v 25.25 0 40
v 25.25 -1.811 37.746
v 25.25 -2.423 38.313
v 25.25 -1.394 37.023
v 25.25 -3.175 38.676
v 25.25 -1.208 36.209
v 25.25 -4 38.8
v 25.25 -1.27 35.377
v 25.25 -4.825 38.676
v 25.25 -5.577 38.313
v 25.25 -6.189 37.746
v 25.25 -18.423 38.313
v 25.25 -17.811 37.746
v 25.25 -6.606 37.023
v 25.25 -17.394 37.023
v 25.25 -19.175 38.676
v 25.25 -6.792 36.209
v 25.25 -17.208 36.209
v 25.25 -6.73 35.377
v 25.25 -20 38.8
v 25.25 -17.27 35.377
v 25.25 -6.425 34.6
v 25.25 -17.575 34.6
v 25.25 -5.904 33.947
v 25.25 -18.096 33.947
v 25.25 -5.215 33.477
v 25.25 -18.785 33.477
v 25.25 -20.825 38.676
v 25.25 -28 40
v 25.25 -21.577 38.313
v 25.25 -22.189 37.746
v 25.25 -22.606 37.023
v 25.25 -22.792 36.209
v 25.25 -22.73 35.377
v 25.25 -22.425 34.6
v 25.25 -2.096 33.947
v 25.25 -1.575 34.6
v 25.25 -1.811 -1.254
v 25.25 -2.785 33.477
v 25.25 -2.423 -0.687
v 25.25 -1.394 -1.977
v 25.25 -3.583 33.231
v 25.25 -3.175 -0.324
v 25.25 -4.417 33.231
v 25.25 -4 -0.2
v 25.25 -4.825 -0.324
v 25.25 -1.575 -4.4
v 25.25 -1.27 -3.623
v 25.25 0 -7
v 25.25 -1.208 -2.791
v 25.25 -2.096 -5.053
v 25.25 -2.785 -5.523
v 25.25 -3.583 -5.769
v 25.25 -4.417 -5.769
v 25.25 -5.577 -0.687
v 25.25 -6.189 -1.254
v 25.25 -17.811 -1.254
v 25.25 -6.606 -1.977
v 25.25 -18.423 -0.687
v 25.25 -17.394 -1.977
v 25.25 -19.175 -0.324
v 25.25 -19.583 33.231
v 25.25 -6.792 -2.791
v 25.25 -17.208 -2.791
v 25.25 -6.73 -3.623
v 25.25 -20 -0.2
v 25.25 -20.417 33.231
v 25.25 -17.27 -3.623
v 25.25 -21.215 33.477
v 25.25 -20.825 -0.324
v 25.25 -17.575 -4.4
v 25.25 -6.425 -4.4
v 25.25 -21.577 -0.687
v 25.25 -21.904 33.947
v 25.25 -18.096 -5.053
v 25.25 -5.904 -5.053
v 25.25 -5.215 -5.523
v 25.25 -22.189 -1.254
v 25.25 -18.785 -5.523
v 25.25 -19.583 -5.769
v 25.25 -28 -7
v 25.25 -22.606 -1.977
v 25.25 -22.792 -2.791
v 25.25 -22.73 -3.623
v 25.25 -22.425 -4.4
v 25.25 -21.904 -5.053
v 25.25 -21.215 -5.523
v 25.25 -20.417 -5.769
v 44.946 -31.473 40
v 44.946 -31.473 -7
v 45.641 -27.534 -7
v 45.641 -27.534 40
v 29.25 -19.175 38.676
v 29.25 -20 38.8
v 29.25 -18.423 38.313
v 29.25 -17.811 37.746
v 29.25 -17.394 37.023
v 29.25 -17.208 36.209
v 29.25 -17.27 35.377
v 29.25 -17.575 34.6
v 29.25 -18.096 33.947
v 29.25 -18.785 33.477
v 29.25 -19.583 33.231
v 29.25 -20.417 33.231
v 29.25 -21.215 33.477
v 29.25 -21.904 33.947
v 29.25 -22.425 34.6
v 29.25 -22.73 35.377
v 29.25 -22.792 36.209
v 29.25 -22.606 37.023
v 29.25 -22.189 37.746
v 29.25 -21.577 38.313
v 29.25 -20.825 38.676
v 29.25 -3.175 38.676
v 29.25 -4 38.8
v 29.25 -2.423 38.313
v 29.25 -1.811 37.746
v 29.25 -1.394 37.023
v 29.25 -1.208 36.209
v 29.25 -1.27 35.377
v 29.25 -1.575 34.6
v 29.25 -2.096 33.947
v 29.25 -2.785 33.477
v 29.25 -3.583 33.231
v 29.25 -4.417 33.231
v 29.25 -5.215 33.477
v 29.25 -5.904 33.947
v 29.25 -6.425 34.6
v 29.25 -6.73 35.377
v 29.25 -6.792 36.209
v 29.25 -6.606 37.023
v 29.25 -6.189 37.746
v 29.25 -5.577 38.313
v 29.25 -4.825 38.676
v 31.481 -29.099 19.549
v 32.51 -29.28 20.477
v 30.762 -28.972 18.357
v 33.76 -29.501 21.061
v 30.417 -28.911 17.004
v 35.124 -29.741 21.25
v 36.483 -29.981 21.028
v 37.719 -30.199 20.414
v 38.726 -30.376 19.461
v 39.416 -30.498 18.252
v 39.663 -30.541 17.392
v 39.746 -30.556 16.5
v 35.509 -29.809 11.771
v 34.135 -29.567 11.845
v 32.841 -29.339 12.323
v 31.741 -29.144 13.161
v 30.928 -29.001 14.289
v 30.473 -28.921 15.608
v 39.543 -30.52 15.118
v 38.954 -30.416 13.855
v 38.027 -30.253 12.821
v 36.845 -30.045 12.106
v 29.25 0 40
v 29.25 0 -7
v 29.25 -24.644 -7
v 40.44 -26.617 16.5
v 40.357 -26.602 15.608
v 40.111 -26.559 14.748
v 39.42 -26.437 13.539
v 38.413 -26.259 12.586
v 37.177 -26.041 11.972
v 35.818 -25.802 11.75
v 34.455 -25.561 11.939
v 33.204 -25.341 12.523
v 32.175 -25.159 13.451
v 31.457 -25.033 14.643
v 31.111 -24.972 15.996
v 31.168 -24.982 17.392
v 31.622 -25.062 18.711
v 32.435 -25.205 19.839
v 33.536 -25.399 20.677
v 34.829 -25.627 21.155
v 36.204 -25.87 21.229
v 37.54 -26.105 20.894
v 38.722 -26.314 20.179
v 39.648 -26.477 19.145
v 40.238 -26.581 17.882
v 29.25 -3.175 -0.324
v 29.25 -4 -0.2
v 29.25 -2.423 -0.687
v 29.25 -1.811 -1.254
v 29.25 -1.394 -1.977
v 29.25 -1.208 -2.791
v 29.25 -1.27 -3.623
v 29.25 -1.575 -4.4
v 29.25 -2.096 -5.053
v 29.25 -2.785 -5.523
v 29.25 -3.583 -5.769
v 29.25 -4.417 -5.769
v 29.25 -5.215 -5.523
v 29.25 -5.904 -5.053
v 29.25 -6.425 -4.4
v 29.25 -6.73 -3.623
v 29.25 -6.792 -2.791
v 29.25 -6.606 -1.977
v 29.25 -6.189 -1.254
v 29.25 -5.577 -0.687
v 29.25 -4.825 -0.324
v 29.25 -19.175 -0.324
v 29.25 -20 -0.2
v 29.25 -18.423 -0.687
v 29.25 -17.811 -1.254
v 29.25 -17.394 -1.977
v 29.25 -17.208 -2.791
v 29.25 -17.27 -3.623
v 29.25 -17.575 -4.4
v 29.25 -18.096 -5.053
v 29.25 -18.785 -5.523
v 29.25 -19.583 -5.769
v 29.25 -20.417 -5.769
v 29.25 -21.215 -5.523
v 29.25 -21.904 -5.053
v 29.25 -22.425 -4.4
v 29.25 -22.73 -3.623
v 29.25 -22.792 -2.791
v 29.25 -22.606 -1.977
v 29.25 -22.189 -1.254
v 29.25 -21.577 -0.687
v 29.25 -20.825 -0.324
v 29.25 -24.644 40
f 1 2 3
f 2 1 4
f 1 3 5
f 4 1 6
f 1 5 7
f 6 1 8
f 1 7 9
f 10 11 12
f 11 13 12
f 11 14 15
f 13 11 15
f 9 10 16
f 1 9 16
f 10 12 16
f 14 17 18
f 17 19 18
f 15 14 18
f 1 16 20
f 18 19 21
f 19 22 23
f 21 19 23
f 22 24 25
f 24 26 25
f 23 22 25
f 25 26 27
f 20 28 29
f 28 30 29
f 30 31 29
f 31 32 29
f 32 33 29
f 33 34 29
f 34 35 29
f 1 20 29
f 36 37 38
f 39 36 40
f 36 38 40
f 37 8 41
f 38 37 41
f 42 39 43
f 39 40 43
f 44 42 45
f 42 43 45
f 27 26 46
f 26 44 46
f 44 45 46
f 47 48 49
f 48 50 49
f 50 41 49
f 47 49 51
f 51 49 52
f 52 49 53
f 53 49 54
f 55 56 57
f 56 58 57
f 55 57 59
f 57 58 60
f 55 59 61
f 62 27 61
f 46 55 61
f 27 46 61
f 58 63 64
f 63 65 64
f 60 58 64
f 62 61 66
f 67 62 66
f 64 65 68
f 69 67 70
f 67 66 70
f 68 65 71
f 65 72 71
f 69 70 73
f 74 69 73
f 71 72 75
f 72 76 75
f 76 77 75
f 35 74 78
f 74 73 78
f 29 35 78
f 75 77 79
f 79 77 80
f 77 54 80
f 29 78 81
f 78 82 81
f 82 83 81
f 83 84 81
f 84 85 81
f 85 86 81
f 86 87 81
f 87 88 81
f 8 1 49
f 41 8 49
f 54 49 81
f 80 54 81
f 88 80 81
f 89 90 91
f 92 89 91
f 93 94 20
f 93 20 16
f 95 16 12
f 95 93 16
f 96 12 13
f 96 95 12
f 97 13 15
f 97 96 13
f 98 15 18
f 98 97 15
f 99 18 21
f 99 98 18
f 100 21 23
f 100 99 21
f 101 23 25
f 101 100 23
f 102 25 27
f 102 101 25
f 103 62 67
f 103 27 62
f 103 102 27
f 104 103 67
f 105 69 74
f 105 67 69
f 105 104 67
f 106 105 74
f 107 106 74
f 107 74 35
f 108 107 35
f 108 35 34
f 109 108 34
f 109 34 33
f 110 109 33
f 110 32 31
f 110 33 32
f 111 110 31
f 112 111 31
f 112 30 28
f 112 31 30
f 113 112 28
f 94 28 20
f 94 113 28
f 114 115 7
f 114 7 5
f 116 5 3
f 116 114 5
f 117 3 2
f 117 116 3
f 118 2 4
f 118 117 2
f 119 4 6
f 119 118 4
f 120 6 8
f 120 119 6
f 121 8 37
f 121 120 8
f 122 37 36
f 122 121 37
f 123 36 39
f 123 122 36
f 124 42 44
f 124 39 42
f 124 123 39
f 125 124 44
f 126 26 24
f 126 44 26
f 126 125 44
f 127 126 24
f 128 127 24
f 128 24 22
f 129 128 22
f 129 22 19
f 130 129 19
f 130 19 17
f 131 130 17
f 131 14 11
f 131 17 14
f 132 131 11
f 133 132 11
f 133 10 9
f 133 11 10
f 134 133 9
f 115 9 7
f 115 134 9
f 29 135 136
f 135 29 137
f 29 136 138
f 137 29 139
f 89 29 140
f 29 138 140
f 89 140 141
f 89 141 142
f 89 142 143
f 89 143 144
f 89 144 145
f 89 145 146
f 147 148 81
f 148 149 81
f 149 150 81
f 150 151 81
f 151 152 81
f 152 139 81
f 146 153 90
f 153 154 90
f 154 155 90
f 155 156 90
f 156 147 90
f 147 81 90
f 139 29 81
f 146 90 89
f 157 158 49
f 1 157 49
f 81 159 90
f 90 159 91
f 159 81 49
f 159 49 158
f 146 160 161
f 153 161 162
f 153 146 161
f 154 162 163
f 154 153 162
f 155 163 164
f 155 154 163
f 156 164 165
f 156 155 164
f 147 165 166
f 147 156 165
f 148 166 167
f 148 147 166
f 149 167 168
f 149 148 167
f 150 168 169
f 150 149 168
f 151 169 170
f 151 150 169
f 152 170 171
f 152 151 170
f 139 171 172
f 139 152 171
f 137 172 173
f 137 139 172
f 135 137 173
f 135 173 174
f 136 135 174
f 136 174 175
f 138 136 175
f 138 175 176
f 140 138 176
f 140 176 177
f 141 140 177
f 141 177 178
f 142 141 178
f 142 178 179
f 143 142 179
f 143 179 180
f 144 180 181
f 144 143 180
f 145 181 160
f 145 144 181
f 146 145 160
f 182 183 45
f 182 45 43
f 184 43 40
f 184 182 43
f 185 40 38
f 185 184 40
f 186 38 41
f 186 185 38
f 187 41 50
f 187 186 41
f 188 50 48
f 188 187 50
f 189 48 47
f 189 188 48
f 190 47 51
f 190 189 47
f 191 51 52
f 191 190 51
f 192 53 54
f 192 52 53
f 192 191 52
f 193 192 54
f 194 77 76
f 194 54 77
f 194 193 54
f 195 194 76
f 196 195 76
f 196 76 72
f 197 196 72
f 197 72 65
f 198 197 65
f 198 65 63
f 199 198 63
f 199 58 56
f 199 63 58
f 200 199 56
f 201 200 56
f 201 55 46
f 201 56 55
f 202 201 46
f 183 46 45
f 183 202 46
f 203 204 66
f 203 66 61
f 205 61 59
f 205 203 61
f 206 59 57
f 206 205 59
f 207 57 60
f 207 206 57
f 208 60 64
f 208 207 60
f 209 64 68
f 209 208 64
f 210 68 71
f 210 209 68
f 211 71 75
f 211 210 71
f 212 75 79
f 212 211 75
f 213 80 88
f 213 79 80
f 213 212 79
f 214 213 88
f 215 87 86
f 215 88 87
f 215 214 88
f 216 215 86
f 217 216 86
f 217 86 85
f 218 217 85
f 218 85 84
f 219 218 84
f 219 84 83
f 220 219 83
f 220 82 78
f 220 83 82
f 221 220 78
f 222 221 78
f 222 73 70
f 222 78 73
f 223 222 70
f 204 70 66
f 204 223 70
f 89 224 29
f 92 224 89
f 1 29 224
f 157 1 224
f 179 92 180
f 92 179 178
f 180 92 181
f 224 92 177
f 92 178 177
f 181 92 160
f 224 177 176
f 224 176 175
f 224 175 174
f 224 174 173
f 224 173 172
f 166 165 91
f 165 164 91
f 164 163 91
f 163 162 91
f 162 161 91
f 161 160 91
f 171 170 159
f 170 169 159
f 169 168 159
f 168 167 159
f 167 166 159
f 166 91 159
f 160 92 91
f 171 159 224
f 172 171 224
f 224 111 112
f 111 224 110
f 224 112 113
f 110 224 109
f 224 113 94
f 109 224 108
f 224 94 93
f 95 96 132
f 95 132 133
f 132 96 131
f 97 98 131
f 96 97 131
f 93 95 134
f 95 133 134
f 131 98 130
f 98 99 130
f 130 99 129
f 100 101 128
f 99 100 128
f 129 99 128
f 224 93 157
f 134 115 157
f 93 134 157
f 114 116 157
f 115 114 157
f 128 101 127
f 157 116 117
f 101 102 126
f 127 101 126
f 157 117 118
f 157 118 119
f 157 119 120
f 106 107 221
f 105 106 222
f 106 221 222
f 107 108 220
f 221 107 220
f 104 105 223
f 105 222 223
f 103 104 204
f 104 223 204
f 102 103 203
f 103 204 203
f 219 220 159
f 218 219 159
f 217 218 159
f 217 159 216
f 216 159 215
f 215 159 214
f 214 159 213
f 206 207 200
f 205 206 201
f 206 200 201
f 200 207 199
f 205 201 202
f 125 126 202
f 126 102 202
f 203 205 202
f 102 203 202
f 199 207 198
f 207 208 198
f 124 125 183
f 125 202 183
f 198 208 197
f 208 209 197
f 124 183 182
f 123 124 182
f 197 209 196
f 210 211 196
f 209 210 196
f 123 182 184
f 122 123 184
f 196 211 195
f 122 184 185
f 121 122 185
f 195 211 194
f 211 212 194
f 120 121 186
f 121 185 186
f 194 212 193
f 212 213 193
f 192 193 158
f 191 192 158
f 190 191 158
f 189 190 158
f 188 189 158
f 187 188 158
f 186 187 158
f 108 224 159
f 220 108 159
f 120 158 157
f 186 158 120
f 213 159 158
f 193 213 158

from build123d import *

# Parameters (mm, degrees)
CYLINDER017_R               = 2.8
CYLINDER017_DEPTH           = 60
CYLINDER016_R               = 2.8
CYLINDER016_DEPTH           = 60
CYLINDER022_R               = 2.8
CYLINDER022_DEPTH           = 60
CYLINDER021_R               = 2.8
CYLINDER021_DEPTH           = 60
CYLINDER026_R               = 4.75
CYLINDER026_DEPTH           = 16
CYLINDER026_ROLL_ANGLE      = -89.999776
CYLINDER026_PITCH_ANGLE     = 1.4e-05
CYLINDER026_PLACEMENT_ANGLE = -9.999925
PAD006_DEPTH                = 47


with BuildPart() as u006:
    # Cylinder017 → Cylinder017 (new body)
    with BuildSketch(Plane(origin=(41, -20, -3), x_dir=(0, 0, 1), z_dir=(-1, 0, 0))):
        Circle(CYLINDER017_R)
    extrude(amount=CYLINDER017_DEPTH)


with BuildPart() as u005:
    # Cylinder016 → Cylinder016 (new body)
    with BuildSketch(Plane(origin=(41, -4, -3), x_dir=(0, 0, 1), z_dir=(-1, 0, 0))):
        Circle(CYLINDER016_R)
    extrude(amount=CYLINDER016_DEPTH)


with BuildPart() as o006:
    # Cylinder022 → Cylinder022 (new body)
    with BuildSketch(Plane(origin=(41, -4, 36), x_dir=(0, 0, 1), z_dir=(-1, 0, 0))):
        Circle(CYLINDER022_R)
    extrude(amount=CYLINDER022_DEPTH)


with BuildPart() as o005:
    # Cylinder021 → Cylinder021 (new body)
    with BuildSketch(Plane(origin=(41, -20, 36), x_dir=(0, 0, 1), z_dir=(-1, 0, 0))):
        Circle(CYLINDER021_R)
    extrude(amount=CYLINDER021_DEPTH)


with BuildPart() as cylinder026:
    # Cylinder026 → Cylinder026 (new body)
    with BuildSketch(Plane.XY):
        Circle(CYLINDER026_R)
    extrude(amount=CYLINDER026_DEPTH)


with BuildPart() as cylinder026_1:
    # Cylinder026 roll: moved
    add(cylinder026.part.rotate(Axis((0, 0, 0), (1, 0, 0)), CYLINDER026_ROLL_ANGLE))


with BuildPart() as cylinder026_2:
    # Cylinder026 pitch: moved
    add(cylinder026_1.part.rotate(Axis((0, 0, 0), (0, 1, 0)), CYLINDER026_PITCH_ANGLE))


with BuildPart() as cylinder026_3:
    # Cylinder026 placement: moved
    add(cylinder026_2.part.moved(Location((33.913531, -36.278084, 16.499961))).rotate(Axis((33.913531, -36.278084, 16.499961), (0, 0, 1)), CYLINDER026_PLACEMENT_ANGLE))


with BuildPart() as cut027:
    # Sketch006 → Pad006 (new body)
    with BuildSketch(Plane.XY):
        Polygon((29.25, 0), (25.25, 0), (25.25, -28), (44.946155, -31.472964), (45.640748, -27.533733), (29.25, -24.643601), align=None)
    extrude(amount=PAD006_DEPTH)


with BuildPart() as cut027_1:
    # Body006 placement: moved
    add(cut027.part.moved(Location((0, 0, -7))))

    # Cut021: cut Cylinder026
    add(cylinder026_3.part, mode=Mode.SUBTRACT)

    # Cut024: cut O005
    add(o005.part, mode=Mode.SUBTRACT)

    # Cut025: cut O006
    add(o006.part, mode=Mode.SUBTRACT)

    # Cut026: cut U005
    add(u005.part, mode=Mode.SUBTRACT)

    # Cut027: cut U006
    add(u006.part, mode=Mode.SUBTRACT)


solid = cut027_1.part
